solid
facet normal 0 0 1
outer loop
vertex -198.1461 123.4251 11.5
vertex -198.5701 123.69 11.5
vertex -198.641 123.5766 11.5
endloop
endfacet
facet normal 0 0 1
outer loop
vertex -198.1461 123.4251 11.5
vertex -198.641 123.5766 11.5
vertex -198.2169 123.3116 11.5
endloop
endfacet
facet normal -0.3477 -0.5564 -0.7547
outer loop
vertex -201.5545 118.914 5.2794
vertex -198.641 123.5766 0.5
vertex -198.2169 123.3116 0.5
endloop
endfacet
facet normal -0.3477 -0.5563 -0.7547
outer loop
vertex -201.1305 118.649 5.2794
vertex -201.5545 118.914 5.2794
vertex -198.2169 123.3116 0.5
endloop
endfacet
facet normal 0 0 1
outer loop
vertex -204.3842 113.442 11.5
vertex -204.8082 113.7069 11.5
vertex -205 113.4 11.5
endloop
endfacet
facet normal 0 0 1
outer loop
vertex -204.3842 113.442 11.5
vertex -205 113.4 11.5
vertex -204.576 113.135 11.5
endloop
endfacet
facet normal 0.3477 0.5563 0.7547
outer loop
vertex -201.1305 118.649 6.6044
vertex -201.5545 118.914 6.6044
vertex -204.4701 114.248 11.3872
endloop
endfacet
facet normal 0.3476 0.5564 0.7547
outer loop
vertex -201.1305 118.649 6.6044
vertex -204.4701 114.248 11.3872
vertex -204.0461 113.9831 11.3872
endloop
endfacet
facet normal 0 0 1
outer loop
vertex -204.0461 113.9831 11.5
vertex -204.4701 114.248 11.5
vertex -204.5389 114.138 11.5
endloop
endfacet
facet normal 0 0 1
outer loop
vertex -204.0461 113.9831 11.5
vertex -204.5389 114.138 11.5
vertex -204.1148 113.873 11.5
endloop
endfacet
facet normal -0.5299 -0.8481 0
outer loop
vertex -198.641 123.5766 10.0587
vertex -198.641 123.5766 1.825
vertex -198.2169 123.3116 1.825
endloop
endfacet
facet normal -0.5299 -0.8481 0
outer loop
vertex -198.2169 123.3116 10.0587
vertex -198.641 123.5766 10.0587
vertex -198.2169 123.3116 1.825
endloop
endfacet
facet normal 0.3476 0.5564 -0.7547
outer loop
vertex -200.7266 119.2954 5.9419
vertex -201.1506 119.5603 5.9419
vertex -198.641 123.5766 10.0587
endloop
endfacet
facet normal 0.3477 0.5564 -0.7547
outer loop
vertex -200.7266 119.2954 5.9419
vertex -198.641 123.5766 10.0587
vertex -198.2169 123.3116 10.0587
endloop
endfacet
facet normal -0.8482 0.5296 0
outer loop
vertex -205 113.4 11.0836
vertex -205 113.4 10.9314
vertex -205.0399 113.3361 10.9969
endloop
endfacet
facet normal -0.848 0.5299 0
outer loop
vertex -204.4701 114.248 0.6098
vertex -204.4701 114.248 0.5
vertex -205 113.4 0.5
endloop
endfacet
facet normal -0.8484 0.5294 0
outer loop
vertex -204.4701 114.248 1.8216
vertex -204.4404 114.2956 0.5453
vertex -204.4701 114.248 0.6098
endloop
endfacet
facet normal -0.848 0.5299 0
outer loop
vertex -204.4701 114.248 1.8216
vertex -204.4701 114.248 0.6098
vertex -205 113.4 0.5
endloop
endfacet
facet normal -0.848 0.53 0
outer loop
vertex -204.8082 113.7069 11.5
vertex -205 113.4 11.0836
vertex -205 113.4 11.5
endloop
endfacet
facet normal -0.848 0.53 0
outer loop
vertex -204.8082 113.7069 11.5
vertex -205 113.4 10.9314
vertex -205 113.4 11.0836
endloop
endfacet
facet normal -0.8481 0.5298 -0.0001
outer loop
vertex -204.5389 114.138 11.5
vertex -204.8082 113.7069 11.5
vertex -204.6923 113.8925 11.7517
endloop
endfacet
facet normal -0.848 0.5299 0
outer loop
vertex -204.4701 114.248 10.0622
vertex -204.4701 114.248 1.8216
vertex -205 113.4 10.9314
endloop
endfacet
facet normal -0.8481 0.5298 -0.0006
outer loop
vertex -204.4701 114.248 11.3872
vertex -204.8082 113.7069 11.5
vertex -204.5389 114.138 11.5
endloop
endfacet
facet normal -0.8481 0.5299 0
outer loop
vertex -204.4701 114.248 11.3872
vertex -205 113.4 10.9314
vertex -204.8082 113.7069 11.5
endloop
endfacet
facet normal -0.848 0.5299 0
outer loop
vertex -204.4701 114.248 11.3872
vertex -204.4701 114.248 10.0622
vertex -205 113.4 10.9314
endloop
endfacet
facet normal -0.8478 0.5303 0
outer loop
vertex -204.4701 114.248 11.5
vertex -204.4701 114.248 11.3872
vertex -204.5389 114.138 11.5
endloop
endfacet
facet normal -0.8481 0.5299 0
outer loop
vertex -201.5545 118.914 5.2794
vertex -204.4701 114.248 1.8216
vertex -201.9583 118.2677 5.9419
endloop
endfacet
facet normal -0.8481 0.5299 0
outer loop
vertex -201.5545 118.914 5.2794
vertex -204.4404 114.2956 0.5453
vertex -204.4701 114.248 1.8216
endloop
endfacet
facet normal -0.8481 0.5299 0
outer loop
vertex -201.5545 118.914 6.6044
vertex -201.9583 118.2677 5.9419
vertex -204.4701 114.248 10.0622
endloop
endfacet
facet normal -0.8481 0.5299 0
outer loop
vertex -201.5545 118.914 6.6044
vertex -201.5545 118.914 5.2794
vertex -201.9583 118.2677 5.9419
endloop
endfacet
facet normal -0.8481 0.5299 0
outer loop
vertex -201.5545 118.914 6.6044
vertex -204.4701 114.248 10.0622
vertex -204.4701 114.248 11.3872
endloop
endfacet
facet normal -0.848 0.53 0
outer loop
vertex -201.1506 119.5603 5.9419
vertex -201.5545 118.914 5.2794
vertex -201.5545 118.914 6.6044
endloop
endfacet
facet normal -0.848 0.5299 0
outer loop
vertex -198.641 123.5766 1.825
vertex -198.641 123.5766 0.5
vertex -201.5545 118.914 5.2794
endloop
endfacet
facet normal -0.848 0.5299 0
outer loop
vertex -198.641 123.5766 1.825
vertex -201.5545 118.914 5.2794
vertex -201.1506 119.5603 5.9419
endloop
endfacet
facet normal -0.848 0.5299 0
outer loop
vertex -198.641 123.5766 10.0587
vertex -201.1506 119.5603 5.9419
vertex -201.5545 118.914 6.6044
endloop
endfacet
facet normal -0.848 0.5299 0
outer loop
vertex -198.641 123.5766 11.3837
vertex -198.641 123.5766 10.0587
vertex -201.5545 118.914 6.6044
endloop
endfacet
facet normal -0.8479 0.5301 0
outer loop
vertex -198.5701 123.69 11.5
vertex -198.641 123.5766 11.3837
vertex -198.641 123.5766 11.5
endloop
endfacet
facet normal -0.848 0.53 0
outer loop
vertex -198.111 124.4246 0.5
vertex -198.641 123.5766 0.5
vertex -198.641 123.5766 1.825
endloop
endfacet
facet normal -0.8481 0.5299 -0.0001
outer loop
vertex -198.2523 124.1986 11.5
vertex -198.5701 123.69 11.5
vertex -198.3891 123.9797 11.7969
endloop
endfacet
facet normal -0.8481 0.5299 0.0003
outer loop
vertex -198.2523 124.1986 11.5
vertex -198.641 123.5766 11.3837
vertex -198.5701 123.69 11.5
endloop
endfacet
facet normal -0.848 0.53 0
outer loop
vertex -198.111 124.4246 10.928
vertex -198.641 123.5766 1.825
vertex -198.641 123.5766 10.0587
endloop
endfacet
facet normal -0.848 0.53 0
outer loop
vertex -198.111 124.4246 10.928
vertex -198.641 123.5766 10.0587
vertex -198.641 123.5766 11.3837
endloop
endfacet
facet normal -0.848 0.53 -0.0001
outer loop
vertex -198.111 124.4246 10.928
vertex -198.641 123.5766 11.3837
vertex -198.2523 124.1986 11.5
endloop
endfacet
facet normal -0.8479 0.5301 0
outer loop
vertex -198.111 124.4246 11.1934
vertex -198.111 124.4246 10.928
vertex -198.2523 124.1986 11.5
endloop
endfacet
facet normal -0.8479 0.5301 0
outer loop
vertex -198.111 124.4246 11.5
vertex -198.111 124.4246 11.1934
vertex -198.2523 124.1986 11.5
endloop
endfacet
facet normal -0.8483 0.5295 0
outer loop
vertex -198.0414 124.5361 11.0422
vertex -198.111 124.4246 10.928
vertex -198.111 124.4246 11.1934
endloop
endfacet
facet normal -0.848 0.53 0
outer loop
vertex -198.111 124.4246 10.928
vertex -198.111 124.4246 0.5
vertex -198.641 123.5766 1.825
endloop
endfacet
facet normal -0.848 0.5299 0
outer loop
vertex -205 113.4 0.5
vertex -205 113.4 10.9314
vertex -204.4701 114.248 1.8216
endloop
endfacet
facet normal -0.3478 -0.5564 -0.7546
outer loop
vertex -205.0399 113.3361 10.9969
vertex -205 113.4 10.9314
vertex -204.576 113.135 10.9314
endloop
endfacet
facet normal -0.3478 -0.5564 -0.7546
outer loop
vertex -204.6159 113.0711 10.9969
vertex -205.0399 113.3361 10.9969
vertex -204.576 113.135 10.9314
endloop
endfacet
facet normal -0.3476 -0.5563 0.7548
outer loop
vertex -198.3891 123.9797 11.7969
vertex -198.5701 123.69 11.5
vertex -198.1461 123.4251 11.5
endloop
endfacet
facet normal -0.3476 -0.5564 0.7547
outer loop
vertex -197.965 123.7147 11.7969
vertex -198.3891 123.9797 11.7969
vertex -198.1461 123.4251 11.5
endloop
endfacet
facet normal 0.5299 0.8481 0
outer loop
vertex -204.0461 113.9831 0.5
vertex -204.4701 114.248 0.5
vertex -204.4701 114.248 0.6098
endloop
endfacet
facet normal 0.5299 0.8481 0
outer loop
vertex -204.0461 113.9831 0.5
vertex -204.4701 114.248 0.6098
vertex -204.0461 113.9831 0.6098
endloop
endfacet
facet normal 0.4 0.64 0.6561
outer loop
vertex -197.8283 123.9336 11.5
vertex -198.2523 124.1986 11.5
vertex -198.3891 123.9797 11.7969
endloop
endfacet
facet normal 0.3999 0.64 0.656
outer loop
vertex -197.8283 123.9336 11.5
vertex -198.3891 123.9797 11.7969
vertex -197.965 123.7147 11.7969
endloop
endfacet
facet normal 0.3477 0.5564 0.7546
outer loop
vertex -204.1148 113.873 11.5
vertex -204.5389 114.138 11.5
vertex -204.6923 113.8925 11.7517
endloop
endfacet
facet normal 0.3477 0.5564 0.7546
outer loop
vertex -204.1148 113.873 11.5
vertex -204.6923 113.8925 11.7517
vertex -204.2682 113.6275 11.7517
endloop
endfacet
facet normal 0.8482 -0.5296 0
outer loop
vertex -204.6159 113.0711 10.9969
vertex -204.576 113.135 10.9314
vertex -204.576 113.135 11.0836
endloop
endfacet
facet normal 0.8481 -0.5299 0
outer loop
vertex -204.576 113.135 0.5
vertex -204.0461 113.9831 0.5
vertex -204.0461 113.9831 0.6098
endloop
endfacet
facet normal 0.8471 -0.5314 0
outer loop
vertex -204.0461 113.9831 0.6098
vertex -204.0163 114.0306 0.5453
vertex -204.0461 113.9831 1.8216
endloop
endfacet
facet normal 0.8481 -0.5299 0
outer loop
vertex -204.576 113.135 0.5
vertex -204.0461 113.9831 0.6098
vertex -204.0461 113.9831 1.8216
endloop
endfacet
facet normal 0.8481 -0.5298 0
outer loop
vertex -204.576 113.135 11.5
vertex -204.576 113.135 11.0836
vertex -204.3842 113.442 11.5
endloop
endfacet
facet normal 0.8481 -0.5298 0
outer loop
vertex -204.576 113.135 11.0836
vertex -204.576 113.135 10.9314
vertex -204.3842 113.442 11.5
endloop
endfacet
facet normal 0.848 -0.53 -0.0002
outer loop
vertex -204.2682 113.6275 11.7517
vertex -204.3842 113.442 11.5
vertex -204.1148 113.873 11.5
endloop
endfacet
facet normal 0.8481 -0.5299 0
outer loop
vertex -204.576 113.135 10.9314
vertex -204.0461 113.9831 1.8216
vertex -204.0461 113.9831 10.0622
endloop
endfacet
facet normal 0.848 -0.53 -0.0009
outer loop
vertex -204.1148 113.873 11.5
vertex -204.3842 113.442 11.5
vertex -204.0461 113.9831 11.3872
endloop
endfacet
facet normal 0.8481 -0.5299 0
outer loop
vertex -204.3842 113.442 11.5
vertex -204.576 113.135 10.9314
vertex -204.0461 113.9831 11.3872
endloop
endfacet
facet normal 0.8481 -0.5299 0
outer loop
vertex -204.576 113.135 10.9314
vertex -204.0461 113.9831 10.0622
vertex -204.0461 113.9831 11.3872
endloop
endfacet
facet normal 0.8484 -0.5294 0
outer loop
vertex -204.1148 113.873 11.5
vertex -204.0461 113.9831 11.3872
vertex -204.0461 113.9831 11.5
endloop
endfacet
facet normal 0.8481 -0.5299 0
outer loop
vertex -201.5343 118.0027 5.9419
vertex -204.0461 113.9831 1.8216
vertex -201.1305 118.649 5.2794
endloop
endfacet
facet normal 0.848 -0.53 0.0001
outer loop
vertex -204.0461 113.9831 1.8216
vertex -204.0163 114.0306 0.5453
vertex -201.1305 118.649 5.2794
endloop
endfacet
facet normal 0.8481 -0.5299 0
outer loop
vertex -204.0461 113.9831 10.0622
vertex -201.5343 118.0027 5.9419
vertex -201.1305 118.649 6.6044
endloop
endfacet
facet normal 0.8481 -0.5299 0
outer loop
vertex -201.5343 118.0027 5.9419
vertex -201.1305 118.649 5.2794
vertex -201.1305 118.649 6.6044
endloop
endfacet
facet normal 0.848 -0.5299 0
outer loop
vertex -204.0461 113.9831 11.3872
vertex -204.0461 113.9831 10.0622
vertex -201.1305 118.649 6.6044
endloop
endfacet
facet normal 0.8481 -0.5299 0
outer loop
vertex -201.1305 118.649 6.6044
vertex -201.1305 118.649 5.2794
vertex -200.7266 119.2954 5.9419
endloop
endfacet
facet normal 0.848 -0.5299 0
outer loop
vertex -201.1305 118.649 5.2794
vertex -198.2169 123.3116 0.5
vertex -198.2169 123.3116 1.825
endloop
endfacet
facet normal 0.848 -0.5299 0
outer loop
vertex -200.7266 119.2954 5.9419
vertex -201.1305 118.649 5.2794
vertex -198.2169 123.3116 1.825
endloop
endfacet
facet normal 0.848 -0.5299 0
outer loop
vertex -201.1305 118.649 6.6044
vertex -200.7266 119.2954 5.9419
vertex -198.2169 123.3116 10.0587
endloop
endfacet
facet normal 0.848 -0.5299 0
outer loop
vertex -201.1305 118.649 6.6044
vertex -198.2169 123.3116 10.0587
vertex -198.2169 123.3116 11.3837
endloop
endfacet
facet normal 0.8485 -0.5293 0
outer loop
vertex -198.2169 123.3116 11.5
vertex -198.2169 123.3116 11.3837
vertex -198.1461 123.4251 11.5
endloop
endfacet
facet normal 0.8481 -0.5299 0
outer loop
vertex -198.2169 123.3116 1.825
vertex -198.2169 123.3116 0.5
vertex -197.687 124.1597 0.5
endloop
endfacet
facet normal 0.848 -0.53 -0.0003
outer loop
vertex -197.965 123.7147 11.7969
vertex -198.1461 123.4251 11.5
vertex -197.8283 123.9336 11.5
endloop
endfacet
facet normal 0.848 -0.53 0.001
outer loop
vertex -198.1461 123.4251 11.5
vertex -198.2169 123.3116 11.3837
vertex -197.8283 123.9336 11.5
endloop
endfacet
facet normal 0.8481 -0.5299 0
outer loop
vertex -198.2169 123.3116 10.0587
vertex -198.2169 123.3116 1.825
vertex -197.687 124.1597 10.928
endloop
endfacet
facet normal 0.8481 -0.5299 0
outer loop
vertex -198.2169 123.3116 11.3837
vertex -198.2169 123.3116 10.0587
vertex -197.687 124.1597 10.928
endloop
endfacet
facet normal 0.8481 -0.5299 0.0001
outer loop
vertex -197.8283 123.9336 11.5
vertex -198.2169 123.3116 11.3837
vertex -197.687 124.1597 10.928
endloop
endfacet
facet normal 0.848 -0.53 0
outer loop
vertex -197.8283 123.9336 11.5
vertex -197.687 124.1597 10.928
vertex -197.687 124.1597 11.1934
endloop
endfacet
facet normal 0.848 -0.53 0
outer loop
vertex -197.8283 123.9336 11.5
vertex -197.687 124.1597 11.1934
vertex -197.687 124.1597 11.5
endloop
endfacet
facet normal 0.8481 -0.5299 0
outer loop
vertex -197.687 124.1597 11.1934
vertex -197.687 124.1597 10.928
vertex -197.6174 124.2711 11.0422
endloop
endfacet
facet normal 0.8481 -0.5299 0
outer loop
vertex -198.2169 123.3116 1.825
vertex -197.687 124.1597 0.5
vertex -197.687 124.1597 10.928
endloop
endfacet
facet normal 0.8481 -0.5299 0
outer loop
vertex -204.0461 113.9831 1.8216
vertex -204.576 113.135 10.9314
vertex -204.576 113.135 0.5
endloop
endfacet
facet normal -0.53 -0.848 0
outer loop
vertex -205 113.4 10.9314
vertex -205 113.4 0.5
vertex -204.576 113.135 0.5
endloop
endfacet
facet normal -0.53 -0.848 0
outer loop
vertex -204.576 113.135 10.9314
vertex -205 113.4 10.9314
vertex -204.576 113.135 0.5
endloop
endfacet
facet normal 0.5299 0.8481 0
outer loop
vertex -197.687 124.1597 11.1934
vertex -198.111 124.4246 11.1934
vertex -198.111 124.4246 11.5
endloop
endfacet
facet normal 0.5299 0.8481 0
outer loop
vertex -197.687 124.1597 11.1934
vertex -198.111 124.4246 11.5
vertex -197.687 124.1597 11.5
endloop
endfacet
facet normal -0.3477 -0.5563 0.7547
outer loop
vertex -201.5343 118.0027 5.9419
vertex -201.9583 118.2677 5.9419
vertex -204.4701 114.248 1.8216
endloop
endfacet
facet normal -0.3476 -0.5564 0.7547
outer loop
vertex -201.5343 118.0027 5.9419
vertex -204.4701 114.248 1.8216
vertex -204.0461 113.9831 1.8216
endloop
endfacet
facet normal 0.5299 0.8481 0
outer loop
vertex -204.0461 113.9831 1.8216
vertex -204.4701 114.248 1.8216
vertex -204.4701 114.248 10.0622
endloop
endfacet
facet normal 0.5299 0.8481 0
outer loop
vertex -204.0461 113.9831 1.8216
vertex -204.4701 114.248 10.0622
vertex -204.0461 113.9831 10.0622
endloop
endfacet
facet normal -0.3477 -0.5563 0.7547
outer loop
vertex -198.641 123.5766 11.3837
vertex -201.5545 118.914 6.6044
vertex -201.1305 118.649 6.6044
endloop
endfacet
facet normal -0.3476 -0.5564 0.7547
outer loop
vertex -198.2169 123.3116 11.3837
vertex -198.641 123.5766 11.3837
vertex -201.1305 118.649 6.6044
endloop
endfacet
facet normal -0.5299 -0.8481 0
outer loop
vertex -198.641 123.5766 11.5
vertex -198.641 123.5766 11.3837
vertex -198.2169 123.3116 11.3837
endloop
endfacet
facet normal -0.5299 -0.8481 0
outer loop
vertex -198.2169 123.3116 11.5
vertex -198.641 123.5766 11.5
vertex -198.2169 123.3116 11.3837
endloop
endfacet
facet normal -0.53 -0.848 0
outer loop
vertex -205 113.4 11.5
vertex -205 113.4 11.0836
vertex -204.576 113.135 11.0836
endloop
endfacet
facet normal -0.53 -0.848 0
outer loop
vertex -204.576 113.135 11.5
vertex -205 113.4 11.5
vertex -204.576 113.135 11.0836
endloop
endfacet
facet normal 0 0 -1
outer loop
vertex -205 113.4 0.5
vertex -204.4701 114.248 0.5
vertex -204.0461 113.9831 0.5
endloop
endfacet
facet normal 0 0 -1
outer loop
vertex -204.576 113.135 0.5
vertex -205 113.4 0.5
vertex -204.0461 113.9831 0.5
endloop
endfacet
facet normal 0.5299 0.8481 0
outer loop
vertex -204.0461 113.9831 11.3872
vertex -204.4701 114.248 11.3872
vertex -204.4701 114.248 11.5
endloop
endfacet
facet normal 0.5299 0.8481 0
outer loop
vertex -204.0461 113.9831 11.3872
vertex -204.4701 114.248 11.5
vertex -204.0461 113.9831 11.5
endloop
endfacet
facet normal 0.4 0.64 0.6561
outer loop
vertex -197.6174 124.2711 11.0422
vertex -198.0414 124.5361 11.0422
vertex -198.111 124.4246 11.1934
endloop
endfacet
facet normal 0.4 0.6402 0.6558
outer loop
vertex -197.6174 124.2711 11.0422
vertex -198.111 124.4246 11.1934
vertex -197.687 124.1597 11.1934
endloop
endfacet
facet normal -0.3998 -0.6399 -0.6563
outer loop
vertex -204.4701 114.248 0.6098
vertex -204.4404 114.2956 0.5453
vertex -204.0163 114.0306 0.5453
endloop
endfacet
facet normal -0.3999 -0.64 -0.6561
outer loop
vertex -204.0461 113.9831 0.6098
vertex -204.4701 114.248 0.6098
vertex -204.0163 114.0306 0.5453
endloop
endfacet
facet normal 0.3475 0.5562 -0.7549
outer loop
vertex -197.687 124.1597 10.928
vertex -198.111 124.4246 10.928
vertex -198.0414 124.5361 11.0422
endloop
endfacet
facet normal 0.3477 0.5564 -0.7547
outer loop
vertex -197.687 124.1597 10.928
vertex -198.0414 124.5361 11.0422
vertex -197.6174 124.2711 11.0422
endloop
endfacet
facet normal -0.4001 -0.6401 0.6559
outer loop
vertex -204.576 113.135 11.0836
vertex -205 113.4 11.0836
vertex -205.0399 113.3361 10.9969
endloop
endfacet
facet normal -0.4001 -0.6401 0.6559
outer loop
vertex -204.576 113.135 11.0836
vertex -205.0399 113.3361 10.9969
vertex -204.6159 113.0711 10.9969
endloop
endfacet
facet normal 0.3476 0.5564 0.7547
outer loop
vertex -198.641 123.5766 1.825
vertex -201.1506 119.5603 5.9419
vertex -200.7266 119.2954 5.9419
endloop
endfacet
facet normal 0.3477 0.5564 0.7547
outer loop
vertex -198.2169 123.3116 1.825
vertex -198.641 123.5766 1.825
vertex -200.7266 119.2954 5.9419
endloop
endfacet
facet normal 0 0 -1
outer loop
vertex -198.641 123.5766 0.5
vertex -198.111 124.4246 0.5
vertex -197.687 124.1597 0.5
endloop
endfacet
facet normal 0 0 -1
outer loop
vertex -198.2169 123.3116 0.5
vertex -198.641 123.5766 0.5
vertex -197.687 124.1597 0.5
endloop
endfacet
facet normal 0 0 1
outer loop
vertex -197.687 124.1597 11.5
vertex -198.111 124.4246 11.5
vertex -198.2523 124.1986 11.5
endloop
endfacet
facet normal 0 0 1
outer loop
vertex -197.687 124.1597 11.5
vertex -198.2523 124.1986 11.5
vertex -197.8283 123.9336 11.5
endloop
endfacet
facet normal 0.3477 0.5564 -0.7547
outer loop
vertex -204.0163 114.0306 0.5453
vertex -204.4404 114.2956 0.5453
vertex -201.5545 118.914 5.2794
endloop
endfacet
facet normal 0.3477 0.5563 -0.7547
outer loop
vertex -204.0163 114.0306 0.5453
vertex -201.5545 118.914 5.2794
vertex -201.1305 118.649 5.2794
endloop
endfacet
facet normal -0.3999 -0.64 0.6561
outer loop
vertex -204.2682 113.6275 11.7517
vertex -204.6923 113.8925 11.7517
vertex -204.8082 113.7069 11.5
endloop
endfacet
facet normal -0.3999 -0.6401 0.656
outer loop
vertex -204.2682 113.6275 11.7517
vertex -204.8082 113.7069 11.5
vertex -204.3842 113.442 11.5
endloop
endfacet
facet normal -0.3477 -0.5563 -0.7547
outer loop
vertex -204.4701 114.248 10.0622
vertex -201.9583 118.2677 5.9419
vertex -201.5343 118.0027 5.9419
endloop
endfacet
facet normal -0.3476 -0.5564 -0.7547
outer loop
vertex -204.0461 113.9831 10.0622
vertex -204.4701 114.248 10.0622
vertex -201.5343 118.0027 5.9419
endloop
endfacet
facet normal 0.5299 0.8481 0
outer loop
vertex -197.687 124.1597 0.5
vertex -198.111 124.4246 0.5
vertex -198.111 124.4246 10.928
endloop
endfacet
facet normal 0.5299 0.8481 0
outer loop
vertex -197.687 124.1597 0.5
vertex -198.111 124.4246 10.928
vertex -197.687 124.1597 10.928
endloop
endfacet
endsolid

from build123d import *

# Parameters (mm, degrees)
BOX224_W                  = 0.5
BOX224_H                  = 1
BOX224_DEPTH              = 11
BOX225_W                  = 0.5
BOX225_H                  = 1
BOX225_DEPTH              = 16
BOX225_ROLL_ANGLE         = 49
BOX226_W                  = 0.5
BOX226_H                  = 1
BOX226_DEPTH              = 16
BOX226_ROLL_ANGLE         = -49
BOX223_W                  = 0.5
BOX223_H                  = 1
BOX223_DEPTH              = 11
FUSION018_PLACEMENT_ANGLE = -32


with BuildPart() as cubo224:
    # Box224 → Box224 (new body)
    with BuildSketch(Plane(origin=(0, 12, 0.5), x_dir=(1, 0, 0), z_dir=(0, 0, 1))):
        with Locations((0.25, 0.5)):
            Rectangle(BOX224_W, BOX224_H)
    extrude(amount=BOX224_DEPTH)


with BuildPart() as cubo225:
    # Box225 → Box225 (new body)
    with BuildSketch(Plane.XY):
        with Locations((0.25, 0.5)):
            Rectangle(BOX225_W, BOX225_H)
    extrude(amount=BOX225_DEPTH)


with BuildPart() as cubo225_1:
    # Box225 roll: moved
    add(cubo225.part.rotate(Axis((0, 0, 0), (1, 0, 0)), BOX225_ROLL_ANGLE))


with BuildPart() as cubo225_2:
    # Box225 placement: moved
    add(cubo225_1.part.moved(Location((0, 12, 0.5))))


with BuildPart() as cubo226:
    # Box226 → Box226 (new body)
    with BuildSketch(Plane.XY):
        with Locations((0.25, 0.5)):
            Rectangle(BOX226_W, BOX226_H)
    extrude(amount=BOX226_DEPTH)


with BuildPart() as cubo226_1:
    # Box226 roll: moved
    add(cubo226.part.rotate(Axis((0, 0, 0), (1, 0, 0)), BOX226_ROLL_ANGLE))


with BuildPart() as cubo226_2:
    # Box226 placement: moved
    add(cubo226_1.part.moved(Location((0, 0.4, 1.3))))


with BuildPart() as fusion018:
    # Box223 → Box223 (new body)
    with BuildSketch(Plane.XY.offset(0.5)):
        with Locations((0.25, 0.5)):
            Rectangle(BOX223_W, BOX223_H)
    extrude(amount=BOX223_DEPTH)

    # Fusion018: union Cubo224, Cubo225, Cubo226
    add(cubo224.part)
    add(cubo225_2.part)
    add(cubo226_2.part)


with BuildPart() as fusion018_1:
    # Fusion018 placement: moved
    add(fusion018.part.moved(Location((-205, 113.4, 0))).rotate(Axis((-205, 113.4, 0), (0, 0, 1)), FUSION018_PLACEMENT_ANGLE))


solid = fusion018_1.part
